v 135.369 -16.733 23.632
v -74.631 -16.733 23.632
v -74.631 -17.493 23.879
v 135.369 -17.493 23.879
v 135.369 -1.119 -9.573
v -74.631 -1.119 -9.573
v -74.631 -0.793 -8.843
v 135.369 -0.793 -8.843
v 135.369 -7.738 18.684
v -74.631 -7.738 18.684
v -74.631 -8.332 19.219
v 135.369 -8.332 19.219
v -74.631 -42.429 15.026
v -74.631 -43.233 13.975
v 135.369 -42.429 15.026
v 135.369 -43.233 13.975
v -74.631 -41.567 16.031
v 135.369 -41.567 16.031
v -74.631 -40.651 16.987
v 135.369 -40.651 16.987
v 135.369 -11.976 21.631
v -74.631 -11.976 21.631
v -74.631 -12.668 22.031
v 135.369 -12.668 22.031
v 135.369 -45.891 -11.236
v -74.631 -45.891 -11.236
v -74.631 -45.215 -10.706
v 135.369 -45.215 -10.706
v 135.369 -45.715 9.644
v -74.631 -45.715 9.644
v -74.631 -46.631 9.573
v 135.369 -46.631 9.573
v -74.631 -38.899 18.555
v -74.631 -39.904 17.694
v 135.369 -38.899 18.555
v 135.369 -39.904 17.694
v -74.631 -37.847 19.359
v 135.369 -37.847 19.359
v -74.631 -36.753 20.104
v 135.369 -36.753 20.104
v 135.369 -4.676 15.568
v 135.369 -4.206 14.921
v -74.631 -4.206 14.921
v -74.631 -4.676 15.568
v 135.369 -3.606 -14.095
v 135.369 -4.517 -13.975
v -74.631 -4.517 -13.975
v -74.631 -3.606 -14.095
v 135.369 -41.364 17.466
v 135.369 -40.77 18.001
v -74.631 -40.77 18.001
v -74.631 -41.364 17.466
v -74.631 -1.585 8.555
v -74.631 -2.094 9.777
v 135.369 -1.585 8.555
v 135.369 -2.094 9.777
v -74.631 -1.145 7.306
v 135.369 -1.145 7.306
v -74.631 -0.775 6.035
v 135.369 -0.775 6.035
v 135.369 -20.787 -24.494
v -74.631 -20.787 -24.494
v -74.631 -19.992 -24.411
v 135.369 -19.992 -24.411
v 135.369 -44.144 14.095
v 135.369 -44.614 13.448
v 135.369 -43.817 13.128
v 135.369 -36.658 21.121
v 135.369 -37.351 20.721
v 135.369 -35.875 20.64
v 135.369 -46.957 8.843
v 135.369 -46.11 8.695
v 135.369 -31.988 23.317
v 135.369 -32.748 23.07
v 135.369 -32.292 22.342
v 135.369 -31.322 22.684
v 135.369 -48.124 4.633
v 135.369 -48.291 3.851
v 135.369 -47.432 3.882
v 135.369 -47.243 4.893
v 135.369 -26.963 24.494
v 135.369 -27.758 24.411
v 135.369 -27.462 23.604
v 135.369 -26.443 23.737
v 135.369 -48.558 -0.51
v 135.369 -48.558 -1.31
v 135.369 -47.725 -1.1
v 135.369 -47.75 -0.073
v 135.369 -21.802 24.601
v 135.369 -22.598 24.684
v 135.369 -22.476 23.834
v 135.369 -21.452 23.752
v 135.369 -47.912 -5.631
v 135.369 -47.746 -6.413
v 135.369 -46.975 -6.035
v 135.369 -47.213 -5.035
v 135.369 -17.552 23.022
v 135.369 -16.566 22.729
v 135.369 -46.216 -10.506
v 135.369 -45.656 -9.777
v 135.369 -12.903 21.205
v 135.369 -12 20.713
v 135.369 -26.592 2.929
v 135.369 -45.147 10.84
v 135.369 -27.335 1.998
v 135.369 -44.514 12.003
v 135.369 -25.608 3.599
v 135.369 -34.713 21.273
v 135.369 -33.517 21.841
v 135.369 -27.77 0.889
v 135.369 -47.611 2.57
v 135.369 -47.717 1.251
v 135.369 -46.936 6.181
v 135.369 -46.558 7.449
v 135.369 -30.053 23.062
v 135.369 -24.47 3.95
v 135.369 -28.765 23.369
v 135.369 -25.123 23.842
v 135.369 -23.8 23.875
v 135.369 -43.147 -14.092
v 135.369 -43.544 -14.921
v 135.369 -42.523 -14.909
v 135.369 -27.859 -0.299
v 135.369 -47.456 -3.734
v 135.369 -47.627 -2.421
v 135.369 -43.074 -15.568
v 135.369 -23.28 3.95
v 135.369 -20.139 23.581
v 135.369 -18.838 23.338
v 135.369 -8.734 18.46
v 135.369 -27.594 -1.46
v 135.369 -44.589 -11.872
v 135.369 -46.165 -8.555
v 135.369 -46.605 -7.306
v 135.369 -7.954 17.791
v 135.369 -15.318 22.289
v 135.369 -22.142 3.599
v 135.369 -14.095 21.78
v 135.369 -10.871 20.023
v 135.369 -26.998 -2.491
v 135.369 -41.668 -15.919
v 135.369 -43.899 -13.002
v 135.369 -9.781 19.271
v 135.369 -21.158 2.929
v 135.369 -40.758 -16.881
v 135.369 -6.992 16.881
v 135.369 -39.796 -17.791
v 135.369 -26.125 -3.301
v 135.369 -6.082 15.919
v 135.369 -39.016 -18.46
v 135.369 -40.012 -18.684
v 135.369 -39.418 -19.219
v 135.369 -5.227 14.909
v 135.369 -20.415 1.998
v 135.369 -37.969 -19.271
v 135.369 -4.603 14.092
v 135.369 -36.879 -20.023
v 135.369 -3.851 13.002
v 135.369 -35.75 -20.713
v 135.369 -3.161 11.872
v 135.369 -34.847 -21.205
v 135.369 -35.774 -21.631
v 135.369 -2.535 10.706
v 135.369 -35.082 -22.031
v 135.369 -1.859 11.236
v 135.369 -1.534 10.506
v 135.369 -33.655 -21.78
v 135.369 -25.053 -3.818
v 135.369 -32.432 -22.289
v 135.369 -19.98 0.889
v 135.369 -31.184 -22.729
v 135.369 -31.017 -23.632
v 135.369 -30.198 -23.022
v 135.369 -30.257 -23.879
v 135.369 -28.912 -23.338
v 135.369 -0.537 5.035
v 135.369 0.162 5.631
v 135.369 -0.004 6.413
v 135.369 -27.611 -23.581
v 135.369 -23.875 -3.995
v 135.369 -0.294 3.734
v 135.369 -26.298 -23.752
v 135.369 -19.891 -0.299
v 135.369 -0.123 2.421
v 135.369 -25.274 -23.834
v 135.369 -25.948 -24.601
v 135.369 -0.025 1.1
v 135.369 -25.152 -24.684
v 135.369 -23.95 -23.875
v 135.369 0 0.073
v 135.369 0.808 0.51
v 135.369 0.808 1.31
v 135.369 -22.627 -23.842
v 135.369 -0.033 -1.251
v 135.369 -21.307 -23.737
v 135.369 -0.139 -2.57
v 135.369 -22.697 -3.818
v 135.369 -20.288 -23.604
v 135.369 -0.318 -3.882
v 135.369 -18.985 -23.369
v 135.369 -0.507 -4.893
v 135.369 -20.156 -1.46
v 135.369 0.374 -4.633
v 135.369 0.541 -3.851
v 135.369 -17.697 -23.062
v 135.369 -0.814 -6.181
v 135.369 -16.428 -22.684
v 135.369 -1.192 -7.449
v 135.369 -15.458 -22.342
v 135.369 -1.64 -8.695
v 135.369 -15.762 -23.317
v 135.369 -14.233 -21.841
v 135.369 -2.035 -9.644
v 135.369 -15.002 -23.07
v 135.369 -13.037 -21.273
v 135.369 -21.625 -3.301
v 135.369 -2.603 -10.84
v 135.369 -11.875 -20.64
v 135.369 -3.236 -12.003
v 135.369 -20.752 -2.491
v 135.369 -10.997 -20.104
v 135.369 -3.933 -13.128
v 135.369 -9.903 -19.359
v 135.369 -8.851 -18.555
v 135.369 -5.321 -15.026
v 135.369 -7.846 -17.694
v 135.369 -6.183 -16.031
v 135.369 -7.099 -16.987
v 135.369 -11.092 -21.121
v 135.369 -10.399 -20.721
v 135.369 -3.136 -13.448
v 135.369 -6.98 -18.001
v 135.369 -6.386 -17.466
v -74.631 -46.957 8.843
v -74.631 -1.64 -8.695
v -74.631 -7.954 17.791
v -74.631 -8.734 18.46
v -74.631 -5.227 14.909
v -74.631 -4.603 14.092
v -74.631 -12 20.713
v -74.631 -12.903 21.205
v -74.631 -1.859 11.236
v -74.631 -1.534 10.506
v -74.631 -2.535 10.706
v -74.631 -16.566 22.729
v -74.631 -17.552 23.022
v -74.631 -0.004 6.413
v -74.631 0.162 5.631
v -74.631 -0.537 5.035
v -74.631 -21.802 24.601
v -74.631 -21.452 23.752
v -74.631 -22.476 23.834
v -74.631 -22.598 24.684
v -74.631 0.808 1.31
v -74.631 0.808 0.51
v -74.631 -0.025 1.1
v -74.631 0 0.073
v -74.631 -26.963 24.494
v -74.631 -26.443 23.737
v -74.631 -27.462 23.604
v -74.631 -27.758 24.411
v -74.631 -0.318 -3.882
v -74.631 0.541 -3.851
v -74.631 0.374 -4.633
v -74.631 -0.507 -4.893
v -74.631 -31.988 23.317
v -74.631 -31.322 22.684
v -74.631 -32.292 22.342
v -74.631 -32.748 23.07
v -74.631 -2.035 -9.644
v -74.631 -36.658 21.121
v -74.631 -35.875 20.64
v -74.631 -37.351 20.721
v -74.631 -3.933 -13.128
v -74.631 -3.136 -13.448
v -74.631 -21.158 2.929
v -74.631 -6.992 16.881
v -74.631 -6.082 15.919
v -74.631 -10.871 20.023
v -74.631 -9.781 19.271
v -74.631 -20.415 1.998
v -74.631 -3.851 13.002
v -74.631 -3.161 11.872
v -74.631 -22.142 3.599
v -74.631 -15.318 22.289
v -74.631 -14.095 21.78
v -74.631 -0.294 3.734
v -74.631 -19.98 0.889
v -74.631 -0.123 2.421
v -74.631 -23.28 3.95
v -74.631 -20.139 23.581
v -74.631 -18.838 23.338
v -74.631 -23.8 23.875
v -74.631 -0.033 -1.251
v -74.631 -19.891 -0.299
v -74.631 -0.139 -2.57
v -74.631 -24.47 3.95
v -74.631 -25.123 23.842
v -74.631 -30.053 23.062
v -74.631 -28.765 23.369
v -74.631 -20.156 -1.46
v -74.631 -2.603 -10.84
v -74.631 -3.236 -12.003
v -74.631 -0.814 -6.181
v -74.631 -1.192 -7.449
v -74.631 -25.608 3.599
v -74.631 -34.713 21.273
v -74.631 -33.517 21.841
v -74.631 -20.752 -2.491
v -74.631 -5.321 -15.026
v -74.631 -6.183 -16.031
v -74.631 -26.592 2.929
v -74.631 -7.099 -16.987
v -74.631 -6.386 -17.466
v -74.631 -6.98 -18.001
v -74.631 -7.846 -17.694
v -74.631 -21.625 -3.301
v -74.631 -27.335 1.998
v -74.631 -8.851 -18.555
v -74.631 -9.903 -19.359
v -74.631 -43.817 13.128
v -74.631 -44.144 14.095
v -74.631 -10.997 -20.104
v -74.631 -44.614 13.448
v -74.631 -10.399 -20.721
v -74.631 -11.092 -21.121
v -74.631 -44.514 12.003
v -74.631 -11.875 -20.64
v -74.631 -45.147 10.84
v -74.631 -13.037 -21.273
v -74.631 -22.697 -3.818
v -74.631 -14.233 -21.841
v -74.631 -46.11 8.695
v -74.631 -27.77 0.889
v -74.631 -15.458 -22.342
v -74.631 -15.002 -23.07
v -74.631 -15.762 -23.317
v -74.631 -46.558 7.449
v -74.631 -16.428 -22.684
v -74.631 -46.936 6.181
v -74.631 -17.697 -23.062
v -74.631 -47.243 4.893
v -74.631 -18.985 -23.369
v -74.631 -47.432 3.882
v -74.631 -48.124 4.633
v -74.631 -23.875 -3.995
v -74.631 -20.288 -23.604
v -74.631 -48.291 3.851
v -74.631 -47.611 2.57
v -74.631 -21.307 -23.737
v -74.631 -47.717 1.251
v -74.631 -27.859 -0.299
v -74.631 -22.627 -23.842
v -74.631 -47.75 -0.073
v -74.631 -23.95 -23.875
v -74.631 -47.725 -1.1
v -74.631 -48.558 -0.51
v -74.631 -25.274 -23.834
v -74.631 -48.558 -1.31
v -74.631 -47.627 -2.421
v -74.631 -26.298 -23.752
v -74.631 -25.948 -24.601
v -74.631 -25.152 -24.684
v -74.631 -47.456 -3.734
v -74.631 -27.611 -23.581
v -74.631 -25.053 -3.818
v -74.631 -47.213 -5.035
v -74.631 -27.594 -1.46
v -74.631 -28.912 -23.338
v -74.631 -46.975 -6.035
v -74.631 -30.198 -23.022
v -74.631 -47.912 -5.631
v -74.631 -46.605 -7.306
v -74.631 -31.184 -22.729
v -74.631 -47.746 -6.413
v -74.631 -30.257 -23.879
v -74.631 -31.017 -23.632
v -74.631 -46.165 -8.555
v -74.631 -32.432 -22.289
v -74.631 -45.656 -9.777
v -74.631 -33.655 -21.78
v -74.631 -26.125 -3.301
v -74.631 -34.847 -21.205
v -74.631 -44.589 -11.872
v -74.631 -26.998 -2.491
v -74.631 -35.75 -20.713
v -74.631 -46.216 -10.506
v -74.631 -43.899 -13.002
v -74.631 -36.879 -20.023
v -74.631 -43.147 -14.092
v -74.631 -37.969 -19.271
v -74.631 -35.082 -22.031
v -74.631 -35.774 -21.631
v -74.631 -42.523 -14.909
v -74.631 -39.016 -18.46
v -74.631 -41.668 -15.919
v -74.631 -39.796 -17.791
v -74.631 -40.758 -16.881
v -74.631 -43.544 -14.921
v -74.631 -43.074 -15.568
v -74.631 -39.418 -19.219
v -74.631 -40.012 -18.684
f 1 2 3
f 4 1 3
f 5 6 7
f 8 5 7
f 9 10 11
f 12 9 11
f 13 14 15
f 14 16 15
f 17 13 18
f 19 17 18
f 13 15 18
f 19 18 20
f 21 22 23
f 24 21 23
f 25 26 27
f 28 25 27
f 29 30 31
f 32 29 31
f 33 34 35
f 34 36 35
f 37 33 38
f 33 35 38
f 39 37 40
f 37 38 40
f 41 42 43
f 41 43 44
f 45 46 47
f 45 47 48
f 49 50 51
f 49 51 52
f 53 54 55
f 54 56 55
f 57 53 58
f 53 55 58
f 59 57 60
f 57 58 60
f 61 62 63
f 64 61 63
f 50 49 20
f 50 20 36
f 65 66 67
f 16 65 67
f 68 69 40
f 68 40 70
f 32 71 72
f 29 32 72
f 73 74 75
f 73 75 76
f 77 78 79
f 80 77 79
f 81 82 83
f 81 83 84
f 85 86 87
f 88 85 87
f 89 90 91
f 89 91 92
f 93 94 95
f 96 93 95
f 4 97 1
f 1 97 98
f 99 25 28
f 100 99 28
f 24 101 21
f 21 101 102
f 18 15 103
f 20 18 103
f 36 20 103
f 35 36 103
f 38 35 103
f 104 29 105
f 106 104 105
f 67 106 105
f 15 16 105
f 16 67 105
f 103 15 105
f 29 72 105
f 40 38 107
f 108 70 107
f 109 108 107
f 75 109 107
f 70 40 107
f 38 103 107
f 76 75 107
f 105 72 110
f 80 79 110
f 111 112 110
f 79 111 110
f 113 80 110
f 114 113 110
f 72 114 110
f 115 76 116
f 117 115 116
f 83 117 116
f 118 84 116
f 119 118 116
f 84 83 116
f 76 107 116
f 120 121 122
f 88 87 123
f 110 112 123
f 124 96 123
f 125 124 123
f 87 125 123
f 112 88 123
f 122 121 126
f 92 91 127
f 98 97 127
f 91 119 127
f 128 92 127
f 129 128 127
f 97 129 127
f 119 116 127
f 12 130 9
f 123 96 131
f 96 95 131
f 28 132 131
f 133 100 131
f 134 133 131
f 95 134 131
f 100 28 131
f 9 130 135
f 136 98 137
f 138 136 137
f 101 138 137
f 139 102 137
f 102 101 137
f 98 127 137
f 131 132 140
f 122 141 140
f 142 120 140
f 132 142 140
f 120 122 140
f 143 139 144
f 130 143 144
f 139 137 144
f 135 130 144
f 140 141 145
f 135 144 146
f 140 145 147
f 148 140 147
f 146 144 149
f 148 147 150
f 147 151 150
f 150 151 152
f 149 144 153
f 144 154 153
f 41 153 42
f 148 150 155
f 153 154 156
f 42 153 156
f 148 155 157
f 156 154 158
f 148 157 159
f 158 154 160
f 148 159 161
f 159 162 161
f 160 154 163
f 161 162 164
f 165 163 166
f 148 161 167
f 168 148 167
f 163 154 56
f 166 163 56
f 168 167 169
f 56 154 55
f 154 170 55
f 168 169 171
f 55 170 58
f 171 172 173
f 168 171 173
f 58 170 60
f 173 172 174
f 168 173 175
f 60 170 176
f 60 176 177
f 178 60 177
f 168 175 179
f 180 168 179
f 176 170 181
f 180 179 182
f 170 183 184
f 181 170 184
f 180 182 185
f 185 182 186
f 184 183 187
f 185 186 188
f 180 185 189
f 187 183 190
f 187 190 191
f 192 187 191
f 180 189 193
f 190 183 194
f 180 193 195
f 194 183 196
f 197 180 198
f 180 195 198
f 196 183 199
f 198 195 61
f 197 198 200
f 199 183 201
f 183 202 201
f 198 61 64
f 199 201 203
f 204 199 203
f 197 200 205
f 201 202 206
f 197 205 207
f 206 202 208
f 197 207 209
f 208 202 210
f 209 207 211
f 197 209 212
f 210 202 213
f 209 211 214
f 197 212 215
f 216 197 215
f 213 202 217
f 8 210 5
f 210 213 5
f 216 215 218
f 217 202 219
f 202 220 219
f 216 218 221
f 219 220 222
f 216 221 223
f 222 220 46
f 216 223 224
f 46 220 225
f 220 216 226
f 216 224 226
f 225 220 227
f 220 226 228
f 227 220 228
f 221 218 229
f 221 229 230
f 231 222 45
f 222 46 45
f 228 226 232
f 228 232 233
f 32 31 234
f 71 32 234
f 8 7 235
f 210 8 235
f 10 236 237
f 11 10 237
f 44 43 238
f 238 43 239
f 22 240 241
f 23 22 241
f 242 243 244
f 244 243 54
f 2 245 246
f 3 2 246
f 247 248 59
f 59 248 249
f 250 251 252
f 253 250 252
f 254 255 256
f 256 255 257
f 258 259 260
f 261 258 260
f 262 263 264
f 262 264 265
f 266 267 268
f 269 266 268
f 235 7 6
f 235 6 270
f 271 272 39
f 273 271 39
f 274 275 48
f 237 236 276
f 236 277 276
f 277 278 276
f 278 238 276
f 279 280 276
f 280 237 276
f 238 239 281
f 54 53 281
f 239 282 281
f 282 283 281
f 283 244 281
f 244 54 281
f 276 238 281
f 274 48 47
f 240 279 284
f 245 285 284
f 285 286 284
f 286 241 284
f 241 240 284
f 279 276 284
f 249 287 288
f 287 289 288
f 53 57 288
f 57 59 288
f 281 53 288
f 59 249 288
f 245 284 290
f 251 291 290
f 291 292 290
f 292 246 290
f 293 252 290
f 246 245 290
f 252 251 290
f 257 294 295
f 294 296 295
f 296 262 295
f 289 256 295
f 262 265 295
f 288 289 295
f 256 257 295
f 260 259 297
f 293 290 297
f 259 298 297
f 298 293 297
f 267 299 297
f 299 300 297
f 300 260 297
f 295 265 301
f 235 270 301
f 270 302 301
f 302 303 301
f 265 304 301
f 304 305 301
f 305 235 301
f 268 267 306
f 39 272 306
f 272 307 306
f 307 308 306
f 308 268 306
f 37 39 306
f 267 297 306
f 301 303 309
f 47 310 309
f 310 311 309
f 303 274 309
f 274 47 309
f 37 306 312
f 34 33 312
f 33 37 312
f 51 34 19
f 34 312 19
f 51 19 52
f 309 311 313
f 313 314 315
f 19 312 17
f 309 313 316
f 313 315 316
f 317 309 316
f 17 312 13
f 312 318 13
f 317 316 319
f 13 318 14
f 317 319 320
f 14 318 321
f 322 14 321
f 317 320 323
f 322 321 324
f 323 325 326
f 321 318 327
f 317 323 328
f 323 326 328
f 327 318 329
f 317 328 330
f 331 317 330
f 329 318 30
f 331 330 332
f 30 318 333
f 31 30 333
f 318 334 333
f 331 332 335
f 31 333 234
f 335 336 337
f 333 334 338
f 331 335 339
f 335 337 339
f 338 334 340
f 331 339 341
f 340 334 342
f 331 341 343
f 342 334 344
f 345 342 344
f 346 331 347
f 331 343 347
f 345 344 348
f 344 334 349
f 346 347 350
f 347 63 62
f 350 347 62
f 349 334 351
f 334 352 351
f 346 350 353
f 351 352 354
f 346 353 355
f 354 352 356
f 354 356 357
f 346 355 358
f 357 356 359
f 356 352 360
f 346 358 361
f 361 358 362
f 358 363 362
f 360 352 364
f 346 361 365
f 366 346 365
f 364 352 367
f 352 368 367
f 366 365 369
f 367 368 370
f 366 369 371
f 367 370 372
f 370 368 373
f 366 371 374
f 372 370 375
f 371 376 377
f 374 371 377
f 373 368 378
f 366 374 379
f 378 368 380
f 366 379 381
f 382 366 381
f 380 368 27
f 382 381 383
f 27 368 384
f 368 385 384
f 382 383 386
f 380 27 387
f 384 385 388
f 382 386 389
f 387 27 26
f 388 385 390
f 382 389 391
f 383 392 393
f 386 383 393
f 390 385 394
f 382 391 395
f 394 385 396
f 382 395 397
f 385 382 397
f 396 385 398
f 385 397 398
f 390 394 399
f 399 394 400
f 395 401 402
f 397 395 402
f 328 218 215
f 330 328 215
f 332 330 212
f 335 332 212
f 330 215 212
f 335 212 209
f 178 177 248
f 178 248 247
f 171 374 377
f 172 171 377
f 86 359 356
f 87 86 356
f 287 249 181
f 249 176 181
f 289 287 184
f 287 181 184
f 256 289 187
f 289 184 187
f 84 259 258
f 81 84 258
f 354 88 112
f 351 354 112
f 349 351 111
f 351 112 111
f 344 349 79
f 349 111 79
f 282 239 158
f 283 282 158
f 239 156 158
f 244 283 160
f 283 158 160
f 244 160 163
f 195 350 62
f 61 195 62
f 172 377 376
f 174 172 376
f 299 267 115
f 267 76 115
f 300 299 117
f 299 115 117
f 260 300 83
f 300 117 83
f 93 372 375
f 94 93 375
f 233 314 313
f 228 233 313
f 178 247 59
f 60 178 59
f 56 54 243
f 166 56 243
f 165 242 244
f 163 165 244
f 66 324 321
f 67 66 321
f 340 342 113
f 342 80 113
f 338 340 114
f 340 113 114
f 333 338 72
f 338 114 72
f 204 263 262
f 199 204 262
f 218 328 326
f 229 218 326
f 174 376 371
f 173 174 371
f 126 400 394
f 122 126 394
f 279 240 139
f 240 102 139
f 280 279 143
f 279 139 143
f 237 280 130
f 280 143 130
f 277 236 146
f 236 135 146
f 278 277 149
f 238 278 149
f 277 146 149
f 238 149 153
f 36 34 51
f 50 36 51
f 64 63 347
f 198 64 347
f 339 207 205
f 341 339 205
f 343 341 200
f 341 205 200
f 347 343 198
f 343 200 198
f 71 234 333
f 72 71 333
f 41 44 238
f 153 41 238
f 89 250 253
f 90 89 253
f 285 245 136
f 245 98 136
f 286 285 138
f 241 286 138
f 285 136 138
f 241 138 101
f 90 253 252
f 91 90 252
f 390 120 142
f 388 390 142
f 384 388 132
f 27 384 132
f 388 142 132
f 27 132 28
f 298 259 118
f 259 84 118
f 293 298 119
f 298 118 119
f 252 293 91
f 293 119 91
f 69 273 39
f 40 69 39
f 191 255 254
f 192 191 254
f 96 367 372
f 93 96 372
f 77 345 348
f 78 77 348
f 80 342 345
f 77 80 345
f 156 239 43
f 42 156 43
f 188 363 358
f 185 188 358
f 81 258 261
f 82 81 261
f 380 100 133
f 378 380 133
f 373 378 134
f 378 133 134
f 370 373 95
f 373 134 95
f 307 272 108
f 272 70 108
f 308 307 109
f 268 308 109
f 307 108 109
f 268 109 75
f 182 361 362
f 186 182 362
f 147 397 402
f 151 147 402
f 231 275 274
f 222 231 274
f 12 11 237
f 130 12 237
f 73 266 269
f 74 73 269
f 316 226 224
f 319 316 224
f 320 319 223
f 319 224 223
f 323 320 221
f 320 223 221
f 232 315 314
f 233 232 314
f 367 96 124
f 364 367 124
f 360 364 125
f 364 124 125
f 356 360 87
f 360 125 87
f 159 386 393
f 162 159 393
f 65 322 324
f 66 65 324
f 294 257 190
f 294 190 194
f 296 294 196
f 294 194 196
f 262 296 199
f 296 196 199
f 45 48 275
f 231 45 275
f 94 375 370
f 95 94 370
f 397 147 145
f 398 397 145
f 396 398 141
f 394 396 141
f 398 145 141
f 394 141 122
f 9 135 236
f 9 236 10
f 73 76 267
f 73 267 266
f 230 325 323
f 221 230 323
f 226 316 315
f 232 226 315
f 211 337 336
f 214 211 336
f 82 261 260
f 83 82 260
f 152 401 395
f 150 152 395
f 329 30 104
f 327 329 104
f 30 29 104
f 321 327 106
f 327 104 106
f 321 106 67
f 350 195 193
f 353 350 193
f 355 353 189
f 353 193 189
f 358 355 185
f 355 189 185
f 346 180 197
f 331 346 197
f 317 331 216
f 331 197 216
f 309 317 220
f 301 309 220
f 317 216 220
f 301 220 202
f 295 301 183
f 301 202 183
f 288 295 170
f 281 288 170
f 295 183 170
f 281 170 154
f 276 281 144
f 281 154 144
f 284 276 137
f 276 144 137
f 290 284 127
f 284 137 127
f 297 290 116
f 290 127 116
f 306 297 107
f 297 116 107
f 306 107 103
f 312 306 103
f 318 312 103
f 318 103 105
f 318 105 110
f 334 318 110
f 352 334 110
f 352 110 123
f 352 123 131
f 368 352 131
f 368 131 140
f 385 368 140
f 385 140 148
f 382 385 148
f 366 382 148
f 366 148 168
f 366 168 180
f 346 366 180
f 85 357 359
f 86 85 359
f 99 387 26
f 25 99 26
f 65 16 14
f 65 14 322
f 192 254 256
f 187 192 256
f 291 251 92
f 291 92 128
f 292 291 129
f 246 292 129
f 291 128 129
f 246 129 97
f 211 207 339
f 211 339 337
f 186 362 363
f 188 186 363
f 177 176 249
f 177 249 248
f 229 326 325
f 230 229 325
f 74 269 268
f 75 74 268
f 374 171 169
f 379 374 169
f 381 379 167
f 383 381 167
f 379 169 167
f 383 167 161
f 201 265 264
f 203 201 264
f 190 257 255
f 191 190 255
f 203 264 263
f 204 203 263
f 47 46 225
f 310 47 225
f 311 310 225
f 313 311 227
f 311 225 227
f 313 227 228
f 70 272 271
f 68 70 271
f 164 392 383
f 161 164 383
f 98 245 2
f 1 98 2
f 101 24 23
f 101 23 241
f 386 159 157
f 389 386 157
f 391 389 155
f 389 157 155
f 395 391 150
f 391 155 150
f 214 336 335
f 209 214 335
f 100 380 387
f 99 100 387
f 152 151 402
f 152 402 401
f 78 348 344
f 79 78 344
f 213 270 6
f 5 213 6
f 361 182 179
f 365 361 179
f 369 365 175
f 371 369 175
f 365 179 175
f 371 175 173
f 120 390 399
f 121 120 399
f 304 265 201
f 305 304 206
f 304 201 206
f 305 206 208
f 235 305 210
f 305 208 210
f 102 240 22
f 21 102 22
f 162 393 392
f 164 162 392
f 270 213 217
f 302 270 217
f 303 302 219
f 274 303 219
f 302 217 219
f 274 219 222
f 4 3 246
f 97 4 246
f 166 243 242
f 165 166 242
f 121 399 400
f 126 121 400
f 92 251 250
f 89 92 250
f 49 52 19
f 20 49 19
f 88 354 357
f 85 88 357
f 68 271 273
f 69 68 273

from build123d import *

# Parameters (mm, degrees)
Y_KSEKLIK_EKSTR_ZYON1_DEPTH = 210
IZIM5_R                     = 1.5
KES_EKSTR_ZYON1_DEPTH       = 35
KES_EKSTR_ZYON1_DEPTH_BACK  = 10
IZIM6_R                     = 1.5
KES_EKSTR_ZYON2_DEPTH       = 67
KES_EKSTR_ZYON2_DEPTH_BACK  = 10
IZIM7_R                     = 3.995
KES_EKSTR_ZYON3_DEPTH       = 310


with BuildPart() as part:
    # Çizim1 → Döndür2 (revolve)
    with BuildSketch(Plane.XY):
        Polygon((-74.631401138, 0), (135.368598862, 0), (135.368598862, -20), (165.368598862, -20), (165.368598862, -23.875), (-104.631401138, -23.875), (-104.631401138, -20), (-74.631401138, -20), align=None)
    revolve(axis=Axis((165.368598862, -23.875, 0), (-1, 0, 0)))

    # Çizim2 → Yükseklik-Ekstrüzyon1 (add)
    with BuildSketch(Plane.ZY.offset(74.631401138)):
        Polygon((-0.239858288, -0.577100131), (0.510254288, 0.807723086), (1.309824836, 0.807723086), (0.910039562, -0.783175015), align=None)
        Polygon((5.691213391, -1.476994658), (4.609288945, -1.036345799), (5.630930698, 0.162258534), (6.413028712, -0.003981531), align=None)
        Polygon((10.223653885, -3.149714613), (9.256988134, -2.493750248), (10.505508417, -1.533749559), (11.235952459, -1.8589642), align=None)
        Polygon((14.309271646, -5.72822899), (13.500112521, -4.885617909), (14.920945007, -4.206177502), (15.567811168, -4.676153278), align=None)
        Polygon((17.769505572, -9.099844337), (17.15321721, -8.107412689), (18.684264701, -7.738227369), (19.219281827, -8.332424084), align=None)
        Polygon((20.453126838, -13.117204887), (20.056643997, -12.018326695), (21.630992371, -11.975531633), (22.030777645, -12.66798004), align=None)
        Polygon((22.242848315, -17.604732704), (22.083499199, -16.44743422), (23.632341877, -16.732899765), (23.879422765, -17.493336545), align=None)
        Polygon((23.060450589, -22.36630129), (23.145199517, -21.20116201), (24.600844643, -21.802411948), (24.684422523, -22.597602365), align=None)
        Polygon((22.870200515, -27.19380725), (23.195343554, -26.071749352), (24.494172449, -26.962506175), (24.410594569, -27.757696592), align=None)
        Polygon((21.680412935, -31.876265407), (22.231739773, -30.846328205), (23.316987384, -31.987661567), (23.069906497, -32.748098346), align=None)
        Polygon((19.543087276, -36.209029872), (20.296502285, -35.316226564), (21.120738083, -36.658254719), (20.720952809, -37.350703125), align=None)
        Polygon((16.551634925, -40.002738046), (17.474210253, -39.286088421), (18.001411179, -40.770158299), (17.466394053, -41.364355014), align=None)
        Polygon((12.836796703, -43.091586678), (13.888211383, -42.582411763), (14.095336226, -44.143662389), (13.448470064, -44.613638165), align=None)
        Polygon((8.560928869, -45.34057826), (9.695231033, -45.061131443), (9.573227443, -46.631328673), (8.842783401, -46.956543314), align=None)
        Polygon((3.910907362, -46.65142107), (5.078522563, -46.613915516), (4.632722683, -48.124434198), (3.85062467, -48.290674262), align=None)
        Polygon((-0.910039562, -46.966824985), (0.239858288, -47.172899869), (-0.510254288, -48.557723086), (-1.309824836, -48.557723086), align=None)
        Polygon((-5.691213391, -46.273005342), (-4.609288945, -46.713654201), (-5.630930698, -47.912258534), (-6.413028712, -47.746018469), align=None)
        Polygon((-10.223653885, -44.600285387), (-9.256988134, -45.256249752), (-10.505508417, -46.216250441), (-11.235952459, -45.8910358), align=None)
        Polygon((-14.309271646, -42.02177101), (-13.500112521, -42.864382091), (-14.920945007, -43.543822498), (-15.567811168, -43.073846722), align=None)
        Polygon((-17.769505572, -38.650155663), (-17.15321721, -39.642587311), (-18.684264701, -40.011772631), (-19.219281827, -39.417575916), align=None)
        Polygon((-20.453126838, -34.632795113), (-20.056643997, -35.731673305), (-21.630992371, -35.774468367), (-22.030777645, -35.08201996), align=None)
        Polygon((-22.242848315, -30.145267296), (-22.083499199, -31.30256578), (-23.632341877, -31.017100235), (-23.879422765, -30.256663455), align=None)
        Polygon((-23.060450589, -25.38369871), (-23.145199517, -26.54883799), (-24.600844643, -25.947588052), (-24.684422523, -25.152397635), align=None)
        Polygon((-22.870200515, -20.55619275), (-23.195343554, -21.678250648), (-24.494172449, -20.787493825), (-24.410594569, -19.992303408), align=None)
        Polygon((-21.680412935, -15.873734593), (-22.231739773, -16.903671795), (-23.316987384, -15.762338433), (-23.069906497, -15.001901654), align=None)
        Polygon((-19.543087276, -11.540970128), (-20.296502285, -12.433773436), (-21.120738083, -11.091745281), (-20.720952809, -10.399296875), align=None)
        Polygon((-16.551634925, -7.747261954), (-17.474210253, -8.463911579), (-18.001411179, -6.979841701), (-17.466394053, -6.385644986), align=None)
        Polygon((-12.836796703, -4.658413322), (-13.888211383, -5.167588237), (-14.095336226, -3.606337611), (-13.448470064, -3.136361835), align=None)
        Polygon((-8.560928869, -2.40942174), (-9.695231033, -2.688868557), (-9.573227443, -1.118671327), (-8.842783401, -0.793456686), align=None)
        Polygon((-3.910907362, -1.09857893), (-5.078522563, -1.136084484), (-4.632722683, 0.374434198), (-3.85062467, 0.540674262), align=None)
    extrude(amount=-Y_KSEKLIK_EKSTR_ZYON1_DEPTH)

    # Çizim5 → Kes-Ekstrüzyon1 (cut, two sides)
    with BuildSketch(Plane.XY) as kes_ekstr_zyon1_sk:
        with Locations((-101.631401138, -23.958656311)):
            Circle(IZIM5_R)
    extrude(amount=KES_EKSTR_ZYON1_DEPTH, mode=Mode.SUBTRACT)
    extrude(kes_ekstr_zyon1_sk.sketch, amount=-KES_EKSTR_ZYON1_DEPTH_BACK, mode=Mode.SUBTRACT)

    # Çizim6 → Kes-Ekstrüzyon2 (cut, two sides)
    with BuildSketch(Plane.XY) as kes_ekstr_zyon2_sk:
        with Locations((162.368598862, -23.875)):
            Circle(IZIM6_R)
    extrude(amount=KES_EKSTR_ZYON2_DEPTH, mode=Mode.SUBTRACT)
    extrude(kes_ekstr_zyon2_sk.sketch, amount=-KES_EKSTR_ZYON2_DEPTH_BACK, mode=Mode.SUBTRACT)

    # Çizim7 → Kes-Ekstrüzyon3 (cut)
    with BuildSketch(Plane(origin=(165.368598862, 0, 0), x_dir=(0, 0, -1), z_dir=(1, 0, 0))):
        with Locations((0, -23.875)):
            Circle(IZIM7_R)
    extrude(amount=-KES_EKSTR_ZYON3_DEPTH, mode=Mode.SUBTRACT)


solid = part.part
